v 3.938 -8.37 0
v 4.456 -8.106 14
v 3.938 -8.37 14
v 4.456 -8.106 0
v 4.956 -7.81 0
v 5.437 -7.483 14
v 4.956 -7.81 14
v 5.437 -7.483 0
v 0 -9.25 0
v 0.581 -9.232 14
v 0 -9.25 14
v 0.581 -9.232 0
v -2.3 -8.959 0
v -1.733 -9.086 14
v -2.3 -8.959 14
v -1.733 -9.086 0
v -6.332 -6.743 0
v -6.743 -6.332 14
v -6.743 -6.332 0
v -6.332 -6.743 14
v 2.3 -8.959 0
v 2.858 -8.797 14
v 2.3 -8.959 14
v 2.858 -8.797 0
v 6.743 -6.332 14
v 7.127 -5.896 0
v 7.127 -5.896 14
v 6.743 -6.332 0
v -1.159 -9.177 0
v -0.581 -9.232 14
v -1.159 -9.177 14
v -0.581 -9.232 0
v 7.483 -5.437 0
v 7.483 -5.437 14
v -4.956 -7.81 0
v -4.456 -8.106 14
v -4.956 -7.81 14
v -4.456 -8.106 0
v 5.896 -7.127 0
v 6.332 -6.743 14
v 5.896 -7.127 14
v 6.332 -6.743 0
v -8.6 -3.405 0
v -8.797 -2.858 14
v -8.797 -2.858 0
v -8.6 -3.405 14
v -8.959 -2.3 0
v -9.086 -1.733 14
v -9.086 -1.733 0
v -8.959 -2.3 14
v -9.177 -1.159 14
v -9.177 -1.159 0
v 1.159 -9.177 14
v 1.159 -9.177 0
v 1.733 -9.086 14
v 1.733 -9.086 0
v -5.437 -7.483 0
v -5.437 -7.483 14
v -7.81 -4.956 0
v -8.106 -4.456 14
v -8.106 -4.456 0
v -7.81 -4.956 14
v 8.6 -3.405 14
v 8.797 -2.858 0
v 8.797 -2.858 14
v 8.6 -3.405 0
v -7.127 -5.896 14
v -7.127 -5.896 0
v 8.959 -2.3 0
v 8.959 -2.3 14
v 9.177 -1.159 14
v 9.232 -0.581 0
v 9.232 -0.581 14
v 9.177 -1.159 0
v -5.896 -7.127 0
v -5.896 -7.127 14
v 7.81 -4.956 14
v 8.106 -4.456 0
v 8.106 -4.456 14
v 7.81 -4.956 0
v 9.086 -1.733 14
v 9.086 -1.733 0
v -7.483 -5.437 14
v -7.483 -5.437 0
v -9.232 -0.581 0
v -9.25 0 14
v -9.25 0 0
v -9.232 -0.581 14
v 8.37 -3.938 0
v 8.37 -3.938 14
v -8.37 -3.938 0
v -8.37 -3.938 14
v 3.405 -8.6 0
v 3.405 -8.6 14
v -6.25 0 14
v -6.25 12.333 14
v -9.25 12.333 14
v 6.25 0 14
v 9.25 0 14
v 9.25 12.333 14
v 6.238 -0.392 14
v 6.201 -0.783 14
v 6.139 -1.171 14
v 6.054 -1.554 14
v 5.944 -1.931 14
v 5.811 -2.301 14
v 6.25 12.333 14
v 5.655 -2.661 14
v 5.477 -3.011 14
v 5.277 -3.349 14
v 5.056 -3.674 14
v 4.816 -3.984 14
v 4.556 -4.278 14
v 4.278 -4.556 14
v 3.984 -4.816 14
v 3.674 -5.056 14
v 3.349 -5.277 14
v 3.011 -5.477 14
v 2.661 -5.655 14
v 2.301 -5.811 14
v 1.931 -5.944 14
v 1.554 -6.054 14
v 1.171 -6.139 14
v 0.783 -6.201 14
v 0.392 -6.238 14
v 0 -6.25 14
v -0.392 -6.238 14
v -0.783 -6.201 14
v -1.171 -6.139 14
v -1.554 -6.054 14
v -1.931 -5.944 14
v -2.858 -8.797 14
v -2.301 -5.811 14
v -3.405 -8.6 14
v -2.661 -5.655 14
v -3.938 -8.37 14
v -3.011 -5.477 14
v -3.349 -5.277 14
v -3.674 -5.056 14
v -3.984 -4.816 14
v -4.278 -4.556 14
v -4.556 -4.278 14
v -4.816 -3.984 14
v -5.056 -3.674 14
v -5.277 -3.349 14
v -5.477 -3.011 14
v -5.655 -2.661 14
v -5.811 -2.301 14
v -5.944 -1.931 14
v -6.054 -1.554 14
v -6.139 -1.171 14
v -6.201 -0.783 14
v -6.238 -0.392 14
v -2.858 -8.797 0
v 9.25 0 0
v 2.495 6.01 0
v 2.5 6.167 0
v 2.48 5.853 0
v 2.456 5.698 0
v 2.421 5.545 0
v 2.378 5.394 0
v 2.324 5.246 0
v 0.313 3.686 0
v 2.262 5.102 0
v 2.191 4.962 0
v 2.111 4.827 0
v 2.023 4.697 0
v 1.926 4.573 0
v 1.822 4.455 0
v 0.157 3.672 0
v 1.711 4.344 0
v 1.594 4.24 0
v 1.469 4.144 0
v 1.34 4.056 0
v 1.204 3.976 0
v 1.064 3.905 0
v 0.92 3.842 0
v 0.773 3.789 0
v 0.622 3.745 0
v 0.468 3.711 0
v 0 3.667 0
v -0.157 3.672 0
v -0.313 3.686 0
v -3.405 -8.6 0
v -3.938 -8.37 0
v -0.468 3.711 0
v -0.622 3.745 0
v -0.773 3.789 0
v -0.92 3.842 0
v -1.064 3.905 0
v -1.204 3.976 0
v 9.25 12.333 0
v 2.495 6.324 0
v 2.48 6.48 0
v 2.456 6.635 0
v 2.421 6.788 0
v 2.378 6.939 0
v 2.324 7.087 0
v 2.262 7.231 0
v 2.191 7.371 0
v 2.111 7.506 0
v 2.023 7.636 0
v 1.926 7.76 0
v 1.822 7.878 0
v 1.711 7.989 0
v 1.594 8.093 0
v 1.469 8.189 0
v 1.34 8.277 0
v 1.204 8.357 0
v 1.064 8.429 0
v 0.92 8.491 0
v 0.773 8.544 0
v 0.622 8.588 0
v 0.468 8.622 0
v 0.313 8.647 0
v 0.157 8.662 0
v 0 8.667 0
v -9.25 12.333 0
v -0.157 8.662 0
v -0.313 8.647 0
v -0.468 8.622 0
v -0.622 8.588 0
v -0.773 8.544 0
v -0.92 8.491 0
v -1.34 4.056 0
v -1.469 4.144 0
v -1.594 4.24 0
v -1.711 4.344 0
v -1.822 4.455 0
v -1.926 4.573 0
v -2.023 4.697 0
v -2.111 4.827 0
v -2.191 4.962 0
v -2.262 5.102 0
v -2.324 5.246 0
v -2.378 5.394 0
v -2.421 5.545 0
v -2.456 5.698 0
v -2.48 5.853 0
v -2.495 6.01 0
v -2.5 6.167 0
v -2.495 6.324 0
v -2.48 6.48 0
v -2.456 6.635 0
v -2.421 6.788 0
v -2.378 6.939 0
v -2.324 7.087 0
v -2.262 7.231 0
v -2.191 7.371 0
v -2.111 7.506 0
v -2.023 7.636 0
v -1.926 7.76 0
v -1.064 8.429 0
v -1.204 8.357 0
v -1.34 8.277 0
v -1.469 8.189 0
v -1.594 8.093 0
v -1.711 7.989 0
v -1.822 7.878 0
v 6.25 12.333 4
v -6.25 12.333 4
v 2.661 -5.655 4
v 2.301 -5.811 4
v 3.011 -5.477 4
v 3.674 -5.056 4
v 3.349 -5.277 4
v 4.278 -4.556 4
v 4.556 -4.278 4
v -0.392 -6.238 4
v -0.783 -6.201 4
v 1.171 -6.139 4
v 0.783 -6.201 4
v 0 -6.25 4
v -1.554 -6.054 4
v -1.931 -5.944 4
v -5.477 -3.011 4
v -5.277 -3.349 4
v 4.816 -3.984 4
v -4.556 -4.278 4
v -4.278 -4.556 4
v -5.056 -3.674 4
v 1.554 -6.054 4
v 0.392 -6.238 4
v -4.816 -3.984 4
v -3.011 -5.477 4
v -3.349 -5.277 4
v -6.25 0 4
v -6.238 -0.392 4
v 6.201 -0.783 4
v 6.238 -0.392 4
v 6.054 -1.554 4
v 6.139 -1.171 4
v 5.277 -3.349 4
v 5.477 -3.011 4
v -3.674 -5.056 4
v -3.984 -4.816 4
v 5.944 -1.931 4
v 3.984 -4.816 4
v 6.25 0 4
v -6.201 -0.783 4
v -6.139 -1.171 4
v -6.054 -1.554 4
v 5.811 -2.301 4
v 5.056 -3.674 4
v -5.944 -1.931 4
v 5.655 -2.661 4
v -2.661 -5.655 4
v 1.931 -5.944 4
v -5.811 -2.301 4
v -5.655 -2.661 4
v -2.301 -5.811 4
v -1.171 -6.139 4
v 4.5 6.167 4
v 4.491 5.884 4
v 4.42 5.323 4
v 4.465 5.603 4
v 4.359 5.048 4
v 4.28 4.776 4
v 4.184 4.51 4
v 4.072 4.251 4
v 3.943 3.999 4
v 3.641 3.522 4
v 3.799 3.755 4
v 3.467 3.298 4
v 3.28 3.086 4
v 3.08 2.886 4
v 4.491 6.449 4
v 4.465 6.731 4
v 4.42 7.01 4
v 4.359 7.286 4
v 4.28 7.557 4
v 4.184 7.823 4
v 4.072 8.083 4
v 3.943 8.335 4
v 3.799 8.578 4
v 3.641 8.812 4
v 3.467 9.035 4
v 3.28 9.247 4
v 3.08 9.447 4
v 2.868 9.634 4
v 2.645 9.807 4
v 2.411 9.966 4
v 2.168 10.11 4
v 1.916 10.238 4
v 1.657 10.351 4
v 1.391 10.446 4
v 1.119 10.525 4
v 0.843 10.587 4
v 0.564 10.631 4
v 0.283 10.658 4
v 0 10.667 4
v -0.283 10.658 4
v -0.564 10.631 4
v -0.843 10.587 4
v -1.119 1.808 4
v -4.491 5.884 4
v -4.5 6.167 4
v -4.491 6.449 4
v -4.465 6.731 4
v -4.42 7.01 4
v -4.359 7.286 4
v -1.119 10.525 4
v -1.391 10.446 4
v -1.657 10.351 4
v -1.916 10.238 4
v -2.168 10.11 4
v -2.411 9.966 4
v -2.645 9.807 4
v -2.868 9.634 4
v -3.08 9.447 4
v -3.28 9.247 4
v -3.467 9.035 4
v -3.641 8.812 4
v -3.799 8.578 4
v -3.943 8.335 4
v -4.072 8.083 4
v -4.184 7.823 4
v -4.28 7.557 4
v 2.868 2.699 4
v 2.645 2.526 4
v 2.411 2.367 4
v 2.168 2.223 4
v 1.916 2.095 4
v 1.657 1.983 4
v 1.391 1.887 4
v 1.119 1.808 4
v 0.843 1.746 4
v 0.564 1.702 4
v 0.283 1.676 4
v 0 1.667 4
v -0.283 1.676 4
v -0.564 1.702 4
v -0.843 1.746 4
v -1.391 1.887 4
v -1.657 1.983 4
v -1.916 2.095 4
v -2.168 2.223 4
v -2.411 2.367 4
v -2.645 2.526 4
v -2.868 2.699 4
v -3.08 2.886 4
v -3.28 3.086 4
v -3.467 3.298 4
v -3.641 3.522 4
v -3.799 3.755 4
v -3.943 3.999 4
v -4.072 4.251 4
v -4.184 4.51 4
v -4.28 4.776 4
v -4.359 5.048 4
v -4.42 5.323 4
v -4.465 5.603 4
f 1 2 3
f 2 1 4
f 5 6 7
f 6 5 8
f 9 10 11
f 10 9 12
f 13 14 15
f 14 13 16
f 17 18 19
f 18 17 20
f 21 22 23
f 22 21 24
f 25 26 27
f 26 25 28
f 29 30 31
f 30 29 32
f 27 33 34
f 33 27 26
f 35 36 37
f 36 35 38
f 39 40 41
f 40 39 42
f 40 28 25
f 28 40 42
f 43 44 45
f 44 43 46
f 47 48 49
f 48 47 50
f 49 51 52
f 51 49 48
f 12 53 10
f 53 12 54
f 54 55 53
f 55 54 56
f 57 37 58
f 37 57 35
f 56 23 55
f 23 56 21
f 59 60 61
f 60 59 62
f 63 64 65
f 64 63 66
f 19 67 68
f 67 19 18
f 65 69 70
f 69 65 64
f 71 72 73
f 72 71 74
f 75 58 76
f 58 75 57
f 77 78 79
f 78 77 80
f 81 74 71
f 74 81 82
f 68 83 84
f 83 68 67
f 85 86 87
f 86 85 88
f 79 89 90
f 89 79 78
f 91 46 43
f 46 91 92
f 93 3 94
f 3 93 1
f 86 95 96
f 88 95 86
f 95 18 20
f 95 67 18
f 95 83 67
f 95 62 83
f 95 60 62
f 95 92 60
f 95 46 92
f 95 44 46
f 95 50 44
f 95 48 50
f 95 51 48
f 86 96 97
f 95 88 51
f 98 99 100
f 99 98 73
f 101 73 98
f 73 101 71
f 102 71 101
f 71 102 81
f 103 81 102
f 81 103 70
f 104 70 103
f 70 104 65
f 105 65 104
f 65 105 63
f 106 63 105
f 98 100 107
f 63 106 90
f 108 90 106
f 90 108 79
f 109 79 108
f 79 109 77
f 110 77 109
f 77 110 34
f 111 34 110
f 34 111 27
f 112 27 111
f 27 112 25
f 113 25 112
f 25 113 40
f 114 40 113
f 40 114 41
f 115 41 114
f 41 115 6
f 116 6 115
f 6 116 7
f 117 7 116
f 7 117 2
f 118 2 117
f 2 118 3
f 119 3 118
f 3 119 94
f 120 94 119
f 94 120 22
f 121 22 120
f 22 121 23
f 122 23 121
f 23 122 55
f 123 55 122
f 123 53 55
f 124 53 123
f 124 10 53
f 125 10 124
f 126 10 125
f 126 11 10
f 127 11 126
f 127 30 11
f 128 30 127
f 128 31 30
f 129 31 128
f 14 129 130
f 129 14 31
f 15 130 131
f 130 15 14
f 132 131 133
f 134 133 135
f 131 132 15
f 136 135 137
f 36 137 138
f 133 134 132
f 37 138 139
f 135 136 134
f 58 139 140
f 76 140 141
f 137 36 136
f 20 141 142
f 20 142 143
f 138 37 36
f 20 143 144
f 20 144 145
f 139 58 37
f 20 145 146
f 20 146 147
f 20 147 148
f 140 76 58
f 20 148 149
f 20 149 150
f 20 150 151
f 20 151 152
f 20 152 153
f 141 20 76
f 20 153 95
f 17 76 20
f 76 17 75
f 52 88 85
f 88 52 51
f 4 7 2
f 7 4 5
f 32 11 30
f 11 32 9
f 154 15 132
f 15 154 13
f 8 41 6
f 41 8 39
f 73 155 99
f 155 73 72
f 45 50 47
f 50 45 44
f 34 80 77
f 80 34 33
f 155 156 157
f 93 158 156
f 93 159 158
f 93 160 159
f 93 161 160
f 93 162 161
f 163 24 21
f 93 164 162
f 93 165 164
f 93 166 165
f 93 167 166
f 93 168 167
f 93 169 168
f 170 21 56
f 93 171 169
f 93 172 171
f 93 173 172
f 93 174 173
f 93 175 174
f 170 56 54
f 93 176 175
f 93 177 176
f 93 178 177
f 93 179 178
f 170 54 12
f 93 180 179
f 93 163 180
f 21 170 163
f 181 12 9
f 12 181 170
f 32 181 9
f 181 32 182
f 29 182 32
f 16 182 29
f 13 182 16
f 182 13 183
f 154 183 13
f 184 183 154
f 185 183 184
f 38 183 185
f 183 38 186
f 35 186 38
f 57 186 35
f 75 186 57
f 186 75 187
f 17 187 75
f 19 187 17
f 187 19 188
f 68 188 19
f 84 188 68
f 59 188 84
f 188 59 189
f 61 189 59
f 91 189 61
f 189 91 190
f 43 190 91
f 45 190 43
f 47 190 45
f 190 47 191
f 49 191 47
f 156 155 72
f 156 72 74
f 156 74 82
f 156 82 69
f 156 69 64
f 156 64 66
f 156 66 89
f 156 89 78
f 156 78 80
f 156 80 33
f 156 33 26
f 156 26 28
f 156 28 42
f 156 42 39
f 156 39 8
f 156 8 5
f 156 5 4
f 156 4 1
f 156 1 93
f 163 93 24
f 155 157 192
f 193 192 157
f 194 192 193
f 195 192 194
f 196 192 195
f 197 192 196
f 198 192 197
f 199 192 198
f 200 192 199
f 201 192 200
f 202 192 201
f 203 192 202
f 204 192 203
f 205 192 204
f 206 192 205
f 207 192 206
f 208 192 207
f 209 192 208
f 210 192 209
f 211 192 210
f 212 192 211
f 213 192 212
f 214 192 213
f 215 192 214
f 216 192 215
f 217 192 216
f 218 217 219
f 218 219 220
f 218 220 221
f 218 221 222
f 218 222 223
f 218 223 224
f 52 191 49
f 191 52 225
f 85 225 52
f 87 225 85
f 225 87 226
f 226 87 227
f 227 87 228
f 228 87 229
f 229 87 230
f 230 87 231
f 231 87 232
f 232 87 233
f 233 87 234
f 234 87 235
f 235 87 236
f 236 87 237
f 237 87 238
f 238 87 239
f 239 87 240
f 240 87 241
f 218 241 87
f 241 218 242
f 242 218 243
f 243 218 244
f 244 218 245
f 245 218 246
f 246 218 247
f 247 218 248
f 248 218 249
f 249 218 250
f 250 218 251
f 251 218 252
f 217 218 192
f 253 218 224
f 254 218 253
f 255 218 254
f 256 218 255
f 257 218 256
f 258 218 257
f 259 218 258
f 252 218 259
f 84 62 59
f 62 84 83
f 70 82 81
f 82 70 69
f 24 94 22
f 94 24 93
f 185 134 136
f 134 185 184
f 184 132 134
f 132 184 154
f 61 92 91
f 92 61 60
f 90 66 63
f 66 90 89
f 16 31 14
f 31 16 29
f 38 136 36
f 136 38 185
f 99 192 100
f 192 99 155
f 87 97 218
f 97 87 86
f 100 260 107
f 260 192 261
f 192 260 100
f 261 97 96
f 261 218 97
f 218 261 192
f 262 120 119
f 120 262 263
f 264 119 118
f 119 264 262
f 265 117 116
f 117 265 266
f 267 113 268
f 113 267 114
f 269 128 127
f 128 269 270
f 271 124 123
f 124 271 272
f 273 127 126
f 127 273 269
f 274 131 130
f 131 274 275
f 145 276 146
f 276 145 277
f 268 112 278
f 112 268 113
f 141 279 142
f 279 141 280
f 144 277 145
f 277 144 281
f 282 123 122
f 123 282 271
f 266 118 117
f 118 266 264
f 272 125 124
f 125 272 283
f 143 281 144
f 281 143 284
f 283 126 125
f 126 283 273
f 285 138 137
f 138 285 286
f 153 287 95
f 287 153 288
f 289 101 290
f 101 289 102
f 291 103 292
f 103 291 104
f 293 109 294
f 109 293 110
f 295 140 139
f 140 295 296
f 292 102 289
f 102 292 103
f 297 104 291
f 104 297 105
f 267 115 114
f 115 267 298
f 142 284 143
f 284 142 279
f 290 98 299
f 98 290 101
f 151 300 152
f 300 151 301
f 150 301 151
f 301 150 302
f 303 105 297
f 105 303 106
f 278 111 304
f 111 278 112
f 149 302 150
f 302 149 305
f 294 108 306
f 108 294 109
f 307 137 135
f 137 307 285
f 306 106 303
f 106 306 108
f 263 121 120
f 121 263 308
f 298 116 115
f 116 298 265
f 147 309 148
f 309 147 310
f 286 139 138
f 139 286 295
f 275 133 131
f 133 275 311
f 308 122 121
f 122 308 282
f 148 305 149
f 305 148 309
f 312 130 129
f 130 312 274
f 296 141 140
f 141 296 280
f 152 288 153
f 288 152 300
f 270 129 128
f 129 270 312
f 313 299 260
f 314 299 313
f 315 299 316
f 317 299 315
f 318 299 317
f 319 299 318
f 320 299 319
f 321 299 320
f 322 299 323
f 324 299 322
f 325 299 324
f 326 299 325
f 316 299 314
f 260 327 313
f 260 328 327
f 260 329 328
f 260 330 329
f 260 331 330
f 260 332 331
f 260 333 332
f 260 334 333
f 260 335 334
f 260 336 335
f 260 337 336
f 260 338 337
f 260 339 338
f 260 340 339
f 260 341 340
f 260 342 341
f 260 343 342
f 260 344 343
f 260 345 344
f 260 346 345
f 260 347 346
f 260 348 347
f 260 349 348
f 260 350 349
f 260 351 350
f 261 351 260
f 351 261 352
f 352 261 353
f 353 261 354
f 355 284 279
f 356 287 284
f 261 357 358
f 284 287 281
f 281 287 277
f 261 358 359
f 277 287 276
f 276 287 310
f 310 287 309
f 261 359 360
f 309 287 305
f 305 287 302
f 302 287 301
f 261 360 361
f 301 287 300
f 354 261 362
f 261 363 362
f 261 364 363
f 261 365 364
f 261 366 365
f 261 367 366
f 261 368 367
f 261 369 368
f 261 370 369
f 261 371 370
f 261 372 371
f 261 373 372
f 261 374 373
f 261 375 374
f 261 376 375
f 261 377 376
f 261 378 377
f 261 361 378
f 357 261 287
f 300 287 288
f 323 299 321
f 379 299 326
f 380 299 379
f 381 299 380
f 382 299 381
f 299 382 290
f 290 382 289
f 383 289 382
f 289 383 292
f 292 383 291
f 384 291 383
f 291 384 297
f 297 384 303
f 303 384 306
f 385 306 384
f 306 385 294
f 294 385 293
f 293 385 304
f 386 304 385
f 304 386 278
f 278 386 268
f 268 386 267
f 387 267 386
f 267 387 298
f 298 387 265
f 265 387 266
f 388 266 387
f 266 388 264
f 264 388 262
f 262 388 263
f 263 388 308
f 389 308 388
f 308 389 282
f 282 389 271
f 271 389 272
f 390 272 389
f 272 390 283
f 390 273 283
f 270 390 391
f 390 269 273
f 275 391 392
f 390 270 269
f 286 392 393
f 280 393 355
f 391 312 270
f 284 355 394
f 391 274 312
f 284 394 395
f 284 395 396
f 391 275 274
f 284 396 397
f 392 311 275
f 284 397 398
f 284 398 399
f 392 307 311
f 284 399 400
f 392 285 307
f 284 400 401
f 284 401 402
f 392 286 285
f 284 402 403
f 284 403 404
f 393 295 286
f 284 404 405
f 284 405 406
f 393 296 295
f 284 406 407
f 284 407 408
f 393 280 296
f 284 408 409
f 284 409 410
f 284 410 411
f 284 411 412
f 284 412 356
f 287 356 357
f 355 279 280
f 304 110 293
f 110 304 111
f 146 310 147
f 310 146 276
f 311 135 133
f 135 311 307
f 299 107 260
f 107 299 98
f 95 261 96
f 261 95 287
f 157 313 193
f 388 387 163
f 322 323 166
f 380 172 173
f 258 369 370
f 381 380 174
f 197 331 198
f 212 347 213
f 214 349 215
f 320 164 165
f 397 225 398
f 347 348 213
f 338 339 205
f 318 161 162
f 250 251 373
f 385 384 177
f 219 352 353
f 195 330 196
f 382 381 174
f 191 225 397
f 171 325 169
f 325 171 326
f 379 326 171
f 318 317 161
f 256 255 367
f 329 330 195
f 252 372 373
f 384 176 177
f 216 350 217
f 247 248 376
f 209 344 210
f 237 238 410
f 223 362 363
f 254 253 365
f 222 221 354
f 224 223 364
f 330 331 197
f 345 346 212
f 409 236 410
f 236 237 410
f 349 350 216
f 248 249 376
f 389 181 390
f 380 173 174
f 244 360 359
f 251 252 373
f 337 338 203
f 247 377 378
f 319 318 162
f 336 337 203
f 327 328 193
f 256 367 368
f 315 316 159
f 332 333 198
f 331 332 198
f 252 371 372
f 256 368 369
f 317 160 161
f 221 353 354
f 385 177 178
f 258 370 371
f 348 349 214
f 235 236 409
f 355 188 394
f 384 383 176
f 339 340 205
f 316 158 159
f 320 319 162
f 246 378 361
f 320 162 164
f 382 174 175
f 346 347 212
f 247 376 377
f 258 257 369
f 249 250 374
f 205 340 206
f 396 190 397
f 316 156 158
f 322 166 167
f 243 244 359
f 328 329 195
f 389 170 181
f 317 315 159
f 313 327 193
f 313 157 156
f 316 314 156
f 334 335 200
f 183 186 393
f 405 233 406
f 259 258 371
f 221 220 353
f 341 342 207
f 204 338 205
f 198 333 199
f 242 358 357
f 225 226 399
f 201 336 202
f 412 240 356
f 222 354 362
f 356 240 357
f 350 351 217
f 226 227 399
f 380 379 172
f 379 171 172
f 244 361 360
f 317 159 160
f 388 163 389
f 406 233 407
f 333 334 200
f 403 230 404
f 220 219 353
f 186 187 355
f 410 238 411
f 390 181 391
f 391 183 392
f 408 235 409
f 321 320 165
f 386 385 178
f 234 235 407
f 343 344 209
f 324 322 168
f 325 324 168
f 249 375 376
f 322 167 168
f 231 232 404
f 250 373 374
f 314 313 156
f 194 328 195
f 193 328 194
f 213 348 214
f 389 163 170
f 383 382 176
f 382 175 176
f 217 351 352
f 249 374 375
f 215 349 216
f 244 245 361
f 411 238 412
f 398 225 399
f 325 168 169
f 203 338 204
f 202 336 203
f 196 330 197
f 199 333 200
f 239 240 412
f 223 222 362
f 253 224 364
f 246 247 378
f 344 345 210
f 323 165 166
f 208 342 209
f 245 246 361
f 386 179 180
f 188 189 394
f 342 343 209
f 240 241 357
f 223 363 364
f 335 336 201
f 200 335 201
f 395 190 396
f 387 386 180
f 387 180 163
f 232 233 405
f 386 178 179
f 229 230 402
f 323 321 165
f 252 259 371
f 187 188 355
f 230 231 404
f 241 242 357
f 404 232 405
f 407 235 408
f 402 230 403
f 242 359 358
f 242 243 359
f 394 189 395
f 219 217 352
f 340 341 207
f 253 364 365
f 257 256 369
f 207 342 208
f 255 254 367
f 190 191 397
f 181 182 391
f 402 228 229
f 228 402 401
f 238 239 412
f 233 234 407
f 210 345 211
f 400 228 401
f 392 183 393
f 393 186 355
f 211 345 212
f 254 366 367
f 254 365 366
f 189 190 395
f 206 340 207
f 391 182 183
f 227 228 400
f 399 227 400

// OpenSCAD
ROD_DIAM = 12.5;
THICKNESS = 4;
SIDE_THICKNESS = 3;

SCREW_DIAM = 5;
SCREW_HEAD_DIAM = 9;

OVERLAP = 10;
HEIGHT = OVERLAP + THICKNESS;
FULL_DIAM =  ROD_DIAM + 2 * SIDE_THICKNESS;

$fn = 100;

difference() {
    union () {
        cylinder(d = FULL_DIAM, h =HEIGHT);
        translate([-FULL_DIAM/2, 0, 0]) cube([FULL_DIAM, FULL_DIAM/3 * 2, HEIGHT]);
    }
    
    translate([0, 0, THICKNESS])  {
        cylinder(d = ROD_DIAM, h =HEIGHT);
        translate([-ROD_DIAM/2, 0, 0]) cube([ROD_DIAM, FULL_DIAM/3 * 2, HEIGHT]);
    }
    
    translate([0, FULL_DIAM/3, 0])cylinder(d1 = SCREW_DIAM, d2 = SCREW_HEAD_DIAM, h = THICKNESS);
}
